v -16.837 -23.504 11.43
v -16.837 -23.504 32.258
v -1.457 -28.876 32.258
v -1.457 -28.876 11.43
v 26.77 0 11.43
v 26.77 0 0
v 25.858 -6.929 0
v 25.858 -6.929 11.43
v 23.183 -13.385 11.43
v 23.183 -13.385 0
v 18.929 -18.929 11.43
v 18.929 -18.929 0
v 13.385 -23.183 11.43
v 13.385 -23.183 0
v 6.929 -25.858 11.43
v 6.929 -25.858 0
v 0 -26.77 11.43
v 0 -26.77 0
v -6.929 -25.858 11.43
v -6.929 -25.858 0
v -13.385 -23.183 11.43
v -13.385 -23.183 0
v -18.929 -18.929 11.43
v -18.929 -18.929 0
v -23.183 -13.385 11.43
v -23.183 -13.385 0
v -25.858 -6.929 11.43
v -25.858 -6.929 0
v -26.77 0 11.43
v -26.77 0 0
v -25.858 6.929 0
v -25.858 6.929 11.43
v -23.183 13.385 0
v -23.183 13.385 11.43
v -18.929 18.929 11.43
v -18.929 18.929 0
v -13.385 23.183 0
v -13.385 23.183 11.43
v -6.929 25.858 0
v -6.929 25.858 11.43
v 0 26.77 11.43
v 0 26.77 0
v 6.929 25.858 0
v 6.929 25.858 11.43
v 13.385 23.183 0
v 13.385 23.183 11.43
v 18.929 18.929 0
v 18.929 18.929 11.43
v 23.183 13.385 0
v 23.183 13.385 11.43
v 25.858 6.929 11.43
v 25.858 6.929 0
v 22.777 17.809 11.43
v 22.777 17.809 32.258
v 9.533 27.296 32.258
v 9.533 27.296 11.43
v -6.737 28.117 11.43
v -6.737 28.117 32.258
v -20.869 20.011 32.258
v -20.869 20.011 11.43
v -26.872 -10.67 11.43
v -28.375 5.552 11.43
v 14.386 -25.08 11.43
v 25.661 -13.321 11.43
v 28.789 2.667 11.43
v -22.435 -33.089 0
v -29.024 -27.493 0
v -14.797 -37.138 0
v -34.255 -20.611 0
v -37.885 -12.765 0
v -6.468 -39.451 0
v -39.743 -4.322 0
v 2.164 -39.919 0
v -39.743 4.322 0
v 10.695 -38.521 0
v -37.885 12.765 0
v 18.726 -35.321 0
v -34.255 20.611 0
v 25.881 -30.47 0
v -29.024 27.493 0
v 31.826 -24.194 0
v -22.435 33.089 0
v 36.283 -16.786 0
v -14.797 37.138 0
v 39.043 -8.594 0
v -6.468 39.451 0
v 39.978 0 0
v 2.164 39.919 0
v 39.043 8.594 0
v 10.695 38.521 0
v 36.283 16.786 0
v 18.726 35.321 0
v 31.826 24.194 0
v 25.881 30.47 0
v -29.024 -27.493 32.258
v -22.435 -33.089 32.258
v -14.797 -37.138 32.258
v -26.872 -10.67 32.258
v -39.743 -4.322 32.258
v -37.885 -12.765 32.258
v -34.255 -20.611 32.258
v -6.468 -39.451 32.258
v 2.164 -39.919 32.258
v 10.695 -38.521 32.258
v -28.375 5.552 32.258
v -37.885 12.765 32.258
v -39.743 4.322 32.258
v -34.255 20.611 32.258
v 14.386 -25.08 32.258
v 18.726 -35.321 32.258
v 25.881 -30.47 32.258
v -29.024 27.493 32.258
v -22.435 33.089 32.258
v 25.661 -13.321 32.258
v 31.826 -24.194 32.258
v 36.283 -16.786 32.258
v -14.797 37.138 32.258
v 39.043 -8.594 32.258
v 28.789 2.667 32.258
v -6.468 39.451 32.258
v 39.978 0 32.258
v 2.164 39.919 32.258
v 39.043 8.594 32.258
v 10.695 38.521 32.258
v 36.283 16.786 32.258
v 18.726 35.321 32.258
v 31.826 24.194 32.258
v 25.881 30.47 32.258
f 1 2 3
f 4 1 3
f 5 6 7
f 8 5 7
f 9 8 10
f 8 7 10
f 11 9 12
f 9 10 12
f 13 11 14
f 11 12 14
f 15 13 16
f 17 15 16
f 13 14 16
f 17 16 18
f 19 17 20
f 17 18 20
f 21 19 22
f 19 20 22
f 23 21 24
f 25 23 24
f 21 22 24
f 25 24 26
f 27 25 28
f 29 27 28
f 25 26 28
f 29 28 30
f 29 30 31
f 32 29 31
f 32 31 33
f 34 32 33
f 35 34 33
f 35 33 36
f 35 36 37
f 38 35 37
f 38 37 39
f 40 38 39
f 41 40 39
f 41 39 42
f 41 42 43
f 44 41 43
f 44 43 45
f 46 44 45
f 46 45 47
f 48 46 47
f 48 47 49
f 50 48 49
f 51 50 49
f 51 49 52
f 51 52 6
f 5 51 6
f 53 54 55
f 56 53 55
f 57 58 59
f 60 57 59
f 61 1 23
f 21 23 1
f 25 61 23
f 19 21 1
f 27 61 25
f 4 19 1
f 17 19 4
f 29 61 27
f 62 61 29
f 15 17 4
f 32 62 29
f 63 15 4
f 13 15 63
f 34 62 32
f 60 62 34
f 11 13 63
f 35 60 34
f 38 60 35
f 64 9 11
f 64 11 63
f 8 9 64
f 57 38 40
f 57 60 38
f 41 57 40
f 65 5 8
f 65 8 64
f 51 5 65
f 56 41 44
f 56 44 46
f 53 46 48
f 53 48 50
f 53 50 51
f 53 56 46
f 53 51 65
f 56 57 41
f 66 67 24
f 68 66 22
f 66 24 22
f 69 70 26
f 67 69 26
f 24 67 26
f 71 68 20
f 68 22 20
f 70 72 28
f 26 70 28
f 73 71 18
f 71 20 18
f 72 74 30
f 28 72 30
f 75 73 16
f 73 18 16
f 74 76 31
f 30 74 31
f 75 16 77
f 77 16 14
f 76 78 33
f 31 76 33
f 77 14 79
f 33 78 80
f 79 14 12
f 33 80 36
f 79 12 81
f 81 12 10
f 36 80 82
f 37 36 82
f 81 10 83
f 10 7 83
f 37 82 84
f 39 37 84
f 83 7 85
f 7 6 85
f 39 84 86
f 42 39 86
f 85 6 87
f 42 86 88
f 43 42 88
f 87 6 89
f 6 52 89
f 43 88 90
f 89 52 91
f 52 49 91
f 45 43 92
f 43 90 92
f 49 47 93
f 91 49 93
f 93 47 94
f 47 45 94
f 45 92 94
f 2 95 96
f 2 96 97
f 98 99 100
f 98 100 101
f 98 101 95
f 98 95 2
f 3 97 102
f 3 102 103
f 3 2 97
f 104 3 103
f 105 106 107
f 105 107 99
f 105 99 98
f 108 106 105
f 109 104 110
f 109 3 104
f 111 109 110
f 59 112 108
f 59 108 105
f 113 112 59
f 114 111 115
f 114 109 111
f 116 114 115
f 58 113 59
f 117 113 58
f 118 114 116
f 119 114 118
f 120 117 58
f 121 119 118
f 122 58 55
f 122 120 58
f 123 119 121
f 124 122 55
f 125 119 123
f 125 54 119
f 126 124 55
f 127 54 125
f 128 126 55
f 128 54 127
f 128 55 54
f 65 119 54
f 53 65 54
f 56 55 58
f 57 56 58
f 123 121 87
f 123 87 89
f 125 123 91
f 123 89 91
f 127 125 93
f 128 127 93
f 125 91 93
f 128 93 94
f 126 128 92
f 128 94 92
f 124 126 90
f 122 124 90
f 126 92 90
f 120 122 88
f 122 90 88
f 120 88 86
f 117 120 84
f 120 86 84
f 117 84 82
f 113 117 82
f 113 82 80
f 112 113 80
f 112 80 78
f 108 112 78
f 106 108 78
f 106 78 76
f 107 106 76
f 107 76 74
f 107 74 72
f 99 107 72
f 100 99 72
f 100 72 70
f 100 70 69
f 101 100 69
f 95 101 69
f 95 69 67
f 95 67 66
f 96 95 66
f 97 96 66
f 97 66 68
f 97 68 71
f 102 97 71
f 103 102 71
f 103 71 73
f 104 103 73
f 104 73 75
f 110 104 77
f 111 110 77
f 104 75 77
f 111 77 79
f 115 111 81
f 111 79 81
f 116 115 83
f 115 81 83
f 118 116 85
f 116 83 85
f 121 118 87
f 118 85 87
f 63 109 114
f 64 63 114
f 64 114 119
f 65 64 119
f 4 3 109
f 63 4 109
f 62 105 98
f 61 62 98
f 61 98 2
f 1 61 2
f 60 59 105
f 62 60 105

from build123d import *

# Parameters (mm, degrees)
F0_R     = 39.9777863274
F1_DEPTH = 53.594
F3_DEPTH = 24.638
F4_DEPTH = 66.802
F5_R     = 26.7697870731
F6_DEPTH = 37.592
F7_DEPTH = 21.336


with BuildPart() as f1:
    # F0 (on Top) → F1 (new body)
    with BuildSketch(Plane.XY):
        Circle(F0_R)
    extrude(amount=F1_DEPTH)

    # F2 (on face) → F3 (join)
    with BuildSketch(Plane.XY.offset(53.594)):
        Polygon((-1.4570151686, -28.8758932938), (14.3857673972, -25.0796691189), (25.6611704593, -13.3208272032), (28.7893332138, 2.6672832291), (22.7770860886, 17.8085500823), (9.5332750655, 27.2957281135), (-6.7372834321, 28.1167053311), (-20.8688020433, 20.0108272692), (-28.3746234576, 5.5516529391), (-26.8717024097, -10.6701319731), (-16.8372057131, -23.5042253753), align=None)
    extrude(amount=F3_DEPTH)

    # F4 (cut): a face of the model
    f4_faces = [f1.faces().sort_by_distance(p)[0] for p in [
        (0, 0, 78.232),
    ]]
    extrude(f4_faces, amount=-F4_DEPTH, mode=Mode.SUBTRACT)

    # F5 (on face) → F6 (cut)
    with BuildSketch(Plane(origin=(0, 0, 0), x_dir=(1, 0, 0), z_dir=(0, 0, -1))):
        Circle(F5_R)
    extrude(amount=-F6_DEPTH, mode=Mode.SUBTRACT)

    # F7 (cut): a face of the model
    f7_faces = [f1.faces().sort_by_distance(p)[0] for p in [
        (-38.8470437751, 0, 53.594),
    ]]
    extrude(f7_faces, amount=-F7_DEPTH, mode=Mode.SUBTRACT)


solid = f1.part
